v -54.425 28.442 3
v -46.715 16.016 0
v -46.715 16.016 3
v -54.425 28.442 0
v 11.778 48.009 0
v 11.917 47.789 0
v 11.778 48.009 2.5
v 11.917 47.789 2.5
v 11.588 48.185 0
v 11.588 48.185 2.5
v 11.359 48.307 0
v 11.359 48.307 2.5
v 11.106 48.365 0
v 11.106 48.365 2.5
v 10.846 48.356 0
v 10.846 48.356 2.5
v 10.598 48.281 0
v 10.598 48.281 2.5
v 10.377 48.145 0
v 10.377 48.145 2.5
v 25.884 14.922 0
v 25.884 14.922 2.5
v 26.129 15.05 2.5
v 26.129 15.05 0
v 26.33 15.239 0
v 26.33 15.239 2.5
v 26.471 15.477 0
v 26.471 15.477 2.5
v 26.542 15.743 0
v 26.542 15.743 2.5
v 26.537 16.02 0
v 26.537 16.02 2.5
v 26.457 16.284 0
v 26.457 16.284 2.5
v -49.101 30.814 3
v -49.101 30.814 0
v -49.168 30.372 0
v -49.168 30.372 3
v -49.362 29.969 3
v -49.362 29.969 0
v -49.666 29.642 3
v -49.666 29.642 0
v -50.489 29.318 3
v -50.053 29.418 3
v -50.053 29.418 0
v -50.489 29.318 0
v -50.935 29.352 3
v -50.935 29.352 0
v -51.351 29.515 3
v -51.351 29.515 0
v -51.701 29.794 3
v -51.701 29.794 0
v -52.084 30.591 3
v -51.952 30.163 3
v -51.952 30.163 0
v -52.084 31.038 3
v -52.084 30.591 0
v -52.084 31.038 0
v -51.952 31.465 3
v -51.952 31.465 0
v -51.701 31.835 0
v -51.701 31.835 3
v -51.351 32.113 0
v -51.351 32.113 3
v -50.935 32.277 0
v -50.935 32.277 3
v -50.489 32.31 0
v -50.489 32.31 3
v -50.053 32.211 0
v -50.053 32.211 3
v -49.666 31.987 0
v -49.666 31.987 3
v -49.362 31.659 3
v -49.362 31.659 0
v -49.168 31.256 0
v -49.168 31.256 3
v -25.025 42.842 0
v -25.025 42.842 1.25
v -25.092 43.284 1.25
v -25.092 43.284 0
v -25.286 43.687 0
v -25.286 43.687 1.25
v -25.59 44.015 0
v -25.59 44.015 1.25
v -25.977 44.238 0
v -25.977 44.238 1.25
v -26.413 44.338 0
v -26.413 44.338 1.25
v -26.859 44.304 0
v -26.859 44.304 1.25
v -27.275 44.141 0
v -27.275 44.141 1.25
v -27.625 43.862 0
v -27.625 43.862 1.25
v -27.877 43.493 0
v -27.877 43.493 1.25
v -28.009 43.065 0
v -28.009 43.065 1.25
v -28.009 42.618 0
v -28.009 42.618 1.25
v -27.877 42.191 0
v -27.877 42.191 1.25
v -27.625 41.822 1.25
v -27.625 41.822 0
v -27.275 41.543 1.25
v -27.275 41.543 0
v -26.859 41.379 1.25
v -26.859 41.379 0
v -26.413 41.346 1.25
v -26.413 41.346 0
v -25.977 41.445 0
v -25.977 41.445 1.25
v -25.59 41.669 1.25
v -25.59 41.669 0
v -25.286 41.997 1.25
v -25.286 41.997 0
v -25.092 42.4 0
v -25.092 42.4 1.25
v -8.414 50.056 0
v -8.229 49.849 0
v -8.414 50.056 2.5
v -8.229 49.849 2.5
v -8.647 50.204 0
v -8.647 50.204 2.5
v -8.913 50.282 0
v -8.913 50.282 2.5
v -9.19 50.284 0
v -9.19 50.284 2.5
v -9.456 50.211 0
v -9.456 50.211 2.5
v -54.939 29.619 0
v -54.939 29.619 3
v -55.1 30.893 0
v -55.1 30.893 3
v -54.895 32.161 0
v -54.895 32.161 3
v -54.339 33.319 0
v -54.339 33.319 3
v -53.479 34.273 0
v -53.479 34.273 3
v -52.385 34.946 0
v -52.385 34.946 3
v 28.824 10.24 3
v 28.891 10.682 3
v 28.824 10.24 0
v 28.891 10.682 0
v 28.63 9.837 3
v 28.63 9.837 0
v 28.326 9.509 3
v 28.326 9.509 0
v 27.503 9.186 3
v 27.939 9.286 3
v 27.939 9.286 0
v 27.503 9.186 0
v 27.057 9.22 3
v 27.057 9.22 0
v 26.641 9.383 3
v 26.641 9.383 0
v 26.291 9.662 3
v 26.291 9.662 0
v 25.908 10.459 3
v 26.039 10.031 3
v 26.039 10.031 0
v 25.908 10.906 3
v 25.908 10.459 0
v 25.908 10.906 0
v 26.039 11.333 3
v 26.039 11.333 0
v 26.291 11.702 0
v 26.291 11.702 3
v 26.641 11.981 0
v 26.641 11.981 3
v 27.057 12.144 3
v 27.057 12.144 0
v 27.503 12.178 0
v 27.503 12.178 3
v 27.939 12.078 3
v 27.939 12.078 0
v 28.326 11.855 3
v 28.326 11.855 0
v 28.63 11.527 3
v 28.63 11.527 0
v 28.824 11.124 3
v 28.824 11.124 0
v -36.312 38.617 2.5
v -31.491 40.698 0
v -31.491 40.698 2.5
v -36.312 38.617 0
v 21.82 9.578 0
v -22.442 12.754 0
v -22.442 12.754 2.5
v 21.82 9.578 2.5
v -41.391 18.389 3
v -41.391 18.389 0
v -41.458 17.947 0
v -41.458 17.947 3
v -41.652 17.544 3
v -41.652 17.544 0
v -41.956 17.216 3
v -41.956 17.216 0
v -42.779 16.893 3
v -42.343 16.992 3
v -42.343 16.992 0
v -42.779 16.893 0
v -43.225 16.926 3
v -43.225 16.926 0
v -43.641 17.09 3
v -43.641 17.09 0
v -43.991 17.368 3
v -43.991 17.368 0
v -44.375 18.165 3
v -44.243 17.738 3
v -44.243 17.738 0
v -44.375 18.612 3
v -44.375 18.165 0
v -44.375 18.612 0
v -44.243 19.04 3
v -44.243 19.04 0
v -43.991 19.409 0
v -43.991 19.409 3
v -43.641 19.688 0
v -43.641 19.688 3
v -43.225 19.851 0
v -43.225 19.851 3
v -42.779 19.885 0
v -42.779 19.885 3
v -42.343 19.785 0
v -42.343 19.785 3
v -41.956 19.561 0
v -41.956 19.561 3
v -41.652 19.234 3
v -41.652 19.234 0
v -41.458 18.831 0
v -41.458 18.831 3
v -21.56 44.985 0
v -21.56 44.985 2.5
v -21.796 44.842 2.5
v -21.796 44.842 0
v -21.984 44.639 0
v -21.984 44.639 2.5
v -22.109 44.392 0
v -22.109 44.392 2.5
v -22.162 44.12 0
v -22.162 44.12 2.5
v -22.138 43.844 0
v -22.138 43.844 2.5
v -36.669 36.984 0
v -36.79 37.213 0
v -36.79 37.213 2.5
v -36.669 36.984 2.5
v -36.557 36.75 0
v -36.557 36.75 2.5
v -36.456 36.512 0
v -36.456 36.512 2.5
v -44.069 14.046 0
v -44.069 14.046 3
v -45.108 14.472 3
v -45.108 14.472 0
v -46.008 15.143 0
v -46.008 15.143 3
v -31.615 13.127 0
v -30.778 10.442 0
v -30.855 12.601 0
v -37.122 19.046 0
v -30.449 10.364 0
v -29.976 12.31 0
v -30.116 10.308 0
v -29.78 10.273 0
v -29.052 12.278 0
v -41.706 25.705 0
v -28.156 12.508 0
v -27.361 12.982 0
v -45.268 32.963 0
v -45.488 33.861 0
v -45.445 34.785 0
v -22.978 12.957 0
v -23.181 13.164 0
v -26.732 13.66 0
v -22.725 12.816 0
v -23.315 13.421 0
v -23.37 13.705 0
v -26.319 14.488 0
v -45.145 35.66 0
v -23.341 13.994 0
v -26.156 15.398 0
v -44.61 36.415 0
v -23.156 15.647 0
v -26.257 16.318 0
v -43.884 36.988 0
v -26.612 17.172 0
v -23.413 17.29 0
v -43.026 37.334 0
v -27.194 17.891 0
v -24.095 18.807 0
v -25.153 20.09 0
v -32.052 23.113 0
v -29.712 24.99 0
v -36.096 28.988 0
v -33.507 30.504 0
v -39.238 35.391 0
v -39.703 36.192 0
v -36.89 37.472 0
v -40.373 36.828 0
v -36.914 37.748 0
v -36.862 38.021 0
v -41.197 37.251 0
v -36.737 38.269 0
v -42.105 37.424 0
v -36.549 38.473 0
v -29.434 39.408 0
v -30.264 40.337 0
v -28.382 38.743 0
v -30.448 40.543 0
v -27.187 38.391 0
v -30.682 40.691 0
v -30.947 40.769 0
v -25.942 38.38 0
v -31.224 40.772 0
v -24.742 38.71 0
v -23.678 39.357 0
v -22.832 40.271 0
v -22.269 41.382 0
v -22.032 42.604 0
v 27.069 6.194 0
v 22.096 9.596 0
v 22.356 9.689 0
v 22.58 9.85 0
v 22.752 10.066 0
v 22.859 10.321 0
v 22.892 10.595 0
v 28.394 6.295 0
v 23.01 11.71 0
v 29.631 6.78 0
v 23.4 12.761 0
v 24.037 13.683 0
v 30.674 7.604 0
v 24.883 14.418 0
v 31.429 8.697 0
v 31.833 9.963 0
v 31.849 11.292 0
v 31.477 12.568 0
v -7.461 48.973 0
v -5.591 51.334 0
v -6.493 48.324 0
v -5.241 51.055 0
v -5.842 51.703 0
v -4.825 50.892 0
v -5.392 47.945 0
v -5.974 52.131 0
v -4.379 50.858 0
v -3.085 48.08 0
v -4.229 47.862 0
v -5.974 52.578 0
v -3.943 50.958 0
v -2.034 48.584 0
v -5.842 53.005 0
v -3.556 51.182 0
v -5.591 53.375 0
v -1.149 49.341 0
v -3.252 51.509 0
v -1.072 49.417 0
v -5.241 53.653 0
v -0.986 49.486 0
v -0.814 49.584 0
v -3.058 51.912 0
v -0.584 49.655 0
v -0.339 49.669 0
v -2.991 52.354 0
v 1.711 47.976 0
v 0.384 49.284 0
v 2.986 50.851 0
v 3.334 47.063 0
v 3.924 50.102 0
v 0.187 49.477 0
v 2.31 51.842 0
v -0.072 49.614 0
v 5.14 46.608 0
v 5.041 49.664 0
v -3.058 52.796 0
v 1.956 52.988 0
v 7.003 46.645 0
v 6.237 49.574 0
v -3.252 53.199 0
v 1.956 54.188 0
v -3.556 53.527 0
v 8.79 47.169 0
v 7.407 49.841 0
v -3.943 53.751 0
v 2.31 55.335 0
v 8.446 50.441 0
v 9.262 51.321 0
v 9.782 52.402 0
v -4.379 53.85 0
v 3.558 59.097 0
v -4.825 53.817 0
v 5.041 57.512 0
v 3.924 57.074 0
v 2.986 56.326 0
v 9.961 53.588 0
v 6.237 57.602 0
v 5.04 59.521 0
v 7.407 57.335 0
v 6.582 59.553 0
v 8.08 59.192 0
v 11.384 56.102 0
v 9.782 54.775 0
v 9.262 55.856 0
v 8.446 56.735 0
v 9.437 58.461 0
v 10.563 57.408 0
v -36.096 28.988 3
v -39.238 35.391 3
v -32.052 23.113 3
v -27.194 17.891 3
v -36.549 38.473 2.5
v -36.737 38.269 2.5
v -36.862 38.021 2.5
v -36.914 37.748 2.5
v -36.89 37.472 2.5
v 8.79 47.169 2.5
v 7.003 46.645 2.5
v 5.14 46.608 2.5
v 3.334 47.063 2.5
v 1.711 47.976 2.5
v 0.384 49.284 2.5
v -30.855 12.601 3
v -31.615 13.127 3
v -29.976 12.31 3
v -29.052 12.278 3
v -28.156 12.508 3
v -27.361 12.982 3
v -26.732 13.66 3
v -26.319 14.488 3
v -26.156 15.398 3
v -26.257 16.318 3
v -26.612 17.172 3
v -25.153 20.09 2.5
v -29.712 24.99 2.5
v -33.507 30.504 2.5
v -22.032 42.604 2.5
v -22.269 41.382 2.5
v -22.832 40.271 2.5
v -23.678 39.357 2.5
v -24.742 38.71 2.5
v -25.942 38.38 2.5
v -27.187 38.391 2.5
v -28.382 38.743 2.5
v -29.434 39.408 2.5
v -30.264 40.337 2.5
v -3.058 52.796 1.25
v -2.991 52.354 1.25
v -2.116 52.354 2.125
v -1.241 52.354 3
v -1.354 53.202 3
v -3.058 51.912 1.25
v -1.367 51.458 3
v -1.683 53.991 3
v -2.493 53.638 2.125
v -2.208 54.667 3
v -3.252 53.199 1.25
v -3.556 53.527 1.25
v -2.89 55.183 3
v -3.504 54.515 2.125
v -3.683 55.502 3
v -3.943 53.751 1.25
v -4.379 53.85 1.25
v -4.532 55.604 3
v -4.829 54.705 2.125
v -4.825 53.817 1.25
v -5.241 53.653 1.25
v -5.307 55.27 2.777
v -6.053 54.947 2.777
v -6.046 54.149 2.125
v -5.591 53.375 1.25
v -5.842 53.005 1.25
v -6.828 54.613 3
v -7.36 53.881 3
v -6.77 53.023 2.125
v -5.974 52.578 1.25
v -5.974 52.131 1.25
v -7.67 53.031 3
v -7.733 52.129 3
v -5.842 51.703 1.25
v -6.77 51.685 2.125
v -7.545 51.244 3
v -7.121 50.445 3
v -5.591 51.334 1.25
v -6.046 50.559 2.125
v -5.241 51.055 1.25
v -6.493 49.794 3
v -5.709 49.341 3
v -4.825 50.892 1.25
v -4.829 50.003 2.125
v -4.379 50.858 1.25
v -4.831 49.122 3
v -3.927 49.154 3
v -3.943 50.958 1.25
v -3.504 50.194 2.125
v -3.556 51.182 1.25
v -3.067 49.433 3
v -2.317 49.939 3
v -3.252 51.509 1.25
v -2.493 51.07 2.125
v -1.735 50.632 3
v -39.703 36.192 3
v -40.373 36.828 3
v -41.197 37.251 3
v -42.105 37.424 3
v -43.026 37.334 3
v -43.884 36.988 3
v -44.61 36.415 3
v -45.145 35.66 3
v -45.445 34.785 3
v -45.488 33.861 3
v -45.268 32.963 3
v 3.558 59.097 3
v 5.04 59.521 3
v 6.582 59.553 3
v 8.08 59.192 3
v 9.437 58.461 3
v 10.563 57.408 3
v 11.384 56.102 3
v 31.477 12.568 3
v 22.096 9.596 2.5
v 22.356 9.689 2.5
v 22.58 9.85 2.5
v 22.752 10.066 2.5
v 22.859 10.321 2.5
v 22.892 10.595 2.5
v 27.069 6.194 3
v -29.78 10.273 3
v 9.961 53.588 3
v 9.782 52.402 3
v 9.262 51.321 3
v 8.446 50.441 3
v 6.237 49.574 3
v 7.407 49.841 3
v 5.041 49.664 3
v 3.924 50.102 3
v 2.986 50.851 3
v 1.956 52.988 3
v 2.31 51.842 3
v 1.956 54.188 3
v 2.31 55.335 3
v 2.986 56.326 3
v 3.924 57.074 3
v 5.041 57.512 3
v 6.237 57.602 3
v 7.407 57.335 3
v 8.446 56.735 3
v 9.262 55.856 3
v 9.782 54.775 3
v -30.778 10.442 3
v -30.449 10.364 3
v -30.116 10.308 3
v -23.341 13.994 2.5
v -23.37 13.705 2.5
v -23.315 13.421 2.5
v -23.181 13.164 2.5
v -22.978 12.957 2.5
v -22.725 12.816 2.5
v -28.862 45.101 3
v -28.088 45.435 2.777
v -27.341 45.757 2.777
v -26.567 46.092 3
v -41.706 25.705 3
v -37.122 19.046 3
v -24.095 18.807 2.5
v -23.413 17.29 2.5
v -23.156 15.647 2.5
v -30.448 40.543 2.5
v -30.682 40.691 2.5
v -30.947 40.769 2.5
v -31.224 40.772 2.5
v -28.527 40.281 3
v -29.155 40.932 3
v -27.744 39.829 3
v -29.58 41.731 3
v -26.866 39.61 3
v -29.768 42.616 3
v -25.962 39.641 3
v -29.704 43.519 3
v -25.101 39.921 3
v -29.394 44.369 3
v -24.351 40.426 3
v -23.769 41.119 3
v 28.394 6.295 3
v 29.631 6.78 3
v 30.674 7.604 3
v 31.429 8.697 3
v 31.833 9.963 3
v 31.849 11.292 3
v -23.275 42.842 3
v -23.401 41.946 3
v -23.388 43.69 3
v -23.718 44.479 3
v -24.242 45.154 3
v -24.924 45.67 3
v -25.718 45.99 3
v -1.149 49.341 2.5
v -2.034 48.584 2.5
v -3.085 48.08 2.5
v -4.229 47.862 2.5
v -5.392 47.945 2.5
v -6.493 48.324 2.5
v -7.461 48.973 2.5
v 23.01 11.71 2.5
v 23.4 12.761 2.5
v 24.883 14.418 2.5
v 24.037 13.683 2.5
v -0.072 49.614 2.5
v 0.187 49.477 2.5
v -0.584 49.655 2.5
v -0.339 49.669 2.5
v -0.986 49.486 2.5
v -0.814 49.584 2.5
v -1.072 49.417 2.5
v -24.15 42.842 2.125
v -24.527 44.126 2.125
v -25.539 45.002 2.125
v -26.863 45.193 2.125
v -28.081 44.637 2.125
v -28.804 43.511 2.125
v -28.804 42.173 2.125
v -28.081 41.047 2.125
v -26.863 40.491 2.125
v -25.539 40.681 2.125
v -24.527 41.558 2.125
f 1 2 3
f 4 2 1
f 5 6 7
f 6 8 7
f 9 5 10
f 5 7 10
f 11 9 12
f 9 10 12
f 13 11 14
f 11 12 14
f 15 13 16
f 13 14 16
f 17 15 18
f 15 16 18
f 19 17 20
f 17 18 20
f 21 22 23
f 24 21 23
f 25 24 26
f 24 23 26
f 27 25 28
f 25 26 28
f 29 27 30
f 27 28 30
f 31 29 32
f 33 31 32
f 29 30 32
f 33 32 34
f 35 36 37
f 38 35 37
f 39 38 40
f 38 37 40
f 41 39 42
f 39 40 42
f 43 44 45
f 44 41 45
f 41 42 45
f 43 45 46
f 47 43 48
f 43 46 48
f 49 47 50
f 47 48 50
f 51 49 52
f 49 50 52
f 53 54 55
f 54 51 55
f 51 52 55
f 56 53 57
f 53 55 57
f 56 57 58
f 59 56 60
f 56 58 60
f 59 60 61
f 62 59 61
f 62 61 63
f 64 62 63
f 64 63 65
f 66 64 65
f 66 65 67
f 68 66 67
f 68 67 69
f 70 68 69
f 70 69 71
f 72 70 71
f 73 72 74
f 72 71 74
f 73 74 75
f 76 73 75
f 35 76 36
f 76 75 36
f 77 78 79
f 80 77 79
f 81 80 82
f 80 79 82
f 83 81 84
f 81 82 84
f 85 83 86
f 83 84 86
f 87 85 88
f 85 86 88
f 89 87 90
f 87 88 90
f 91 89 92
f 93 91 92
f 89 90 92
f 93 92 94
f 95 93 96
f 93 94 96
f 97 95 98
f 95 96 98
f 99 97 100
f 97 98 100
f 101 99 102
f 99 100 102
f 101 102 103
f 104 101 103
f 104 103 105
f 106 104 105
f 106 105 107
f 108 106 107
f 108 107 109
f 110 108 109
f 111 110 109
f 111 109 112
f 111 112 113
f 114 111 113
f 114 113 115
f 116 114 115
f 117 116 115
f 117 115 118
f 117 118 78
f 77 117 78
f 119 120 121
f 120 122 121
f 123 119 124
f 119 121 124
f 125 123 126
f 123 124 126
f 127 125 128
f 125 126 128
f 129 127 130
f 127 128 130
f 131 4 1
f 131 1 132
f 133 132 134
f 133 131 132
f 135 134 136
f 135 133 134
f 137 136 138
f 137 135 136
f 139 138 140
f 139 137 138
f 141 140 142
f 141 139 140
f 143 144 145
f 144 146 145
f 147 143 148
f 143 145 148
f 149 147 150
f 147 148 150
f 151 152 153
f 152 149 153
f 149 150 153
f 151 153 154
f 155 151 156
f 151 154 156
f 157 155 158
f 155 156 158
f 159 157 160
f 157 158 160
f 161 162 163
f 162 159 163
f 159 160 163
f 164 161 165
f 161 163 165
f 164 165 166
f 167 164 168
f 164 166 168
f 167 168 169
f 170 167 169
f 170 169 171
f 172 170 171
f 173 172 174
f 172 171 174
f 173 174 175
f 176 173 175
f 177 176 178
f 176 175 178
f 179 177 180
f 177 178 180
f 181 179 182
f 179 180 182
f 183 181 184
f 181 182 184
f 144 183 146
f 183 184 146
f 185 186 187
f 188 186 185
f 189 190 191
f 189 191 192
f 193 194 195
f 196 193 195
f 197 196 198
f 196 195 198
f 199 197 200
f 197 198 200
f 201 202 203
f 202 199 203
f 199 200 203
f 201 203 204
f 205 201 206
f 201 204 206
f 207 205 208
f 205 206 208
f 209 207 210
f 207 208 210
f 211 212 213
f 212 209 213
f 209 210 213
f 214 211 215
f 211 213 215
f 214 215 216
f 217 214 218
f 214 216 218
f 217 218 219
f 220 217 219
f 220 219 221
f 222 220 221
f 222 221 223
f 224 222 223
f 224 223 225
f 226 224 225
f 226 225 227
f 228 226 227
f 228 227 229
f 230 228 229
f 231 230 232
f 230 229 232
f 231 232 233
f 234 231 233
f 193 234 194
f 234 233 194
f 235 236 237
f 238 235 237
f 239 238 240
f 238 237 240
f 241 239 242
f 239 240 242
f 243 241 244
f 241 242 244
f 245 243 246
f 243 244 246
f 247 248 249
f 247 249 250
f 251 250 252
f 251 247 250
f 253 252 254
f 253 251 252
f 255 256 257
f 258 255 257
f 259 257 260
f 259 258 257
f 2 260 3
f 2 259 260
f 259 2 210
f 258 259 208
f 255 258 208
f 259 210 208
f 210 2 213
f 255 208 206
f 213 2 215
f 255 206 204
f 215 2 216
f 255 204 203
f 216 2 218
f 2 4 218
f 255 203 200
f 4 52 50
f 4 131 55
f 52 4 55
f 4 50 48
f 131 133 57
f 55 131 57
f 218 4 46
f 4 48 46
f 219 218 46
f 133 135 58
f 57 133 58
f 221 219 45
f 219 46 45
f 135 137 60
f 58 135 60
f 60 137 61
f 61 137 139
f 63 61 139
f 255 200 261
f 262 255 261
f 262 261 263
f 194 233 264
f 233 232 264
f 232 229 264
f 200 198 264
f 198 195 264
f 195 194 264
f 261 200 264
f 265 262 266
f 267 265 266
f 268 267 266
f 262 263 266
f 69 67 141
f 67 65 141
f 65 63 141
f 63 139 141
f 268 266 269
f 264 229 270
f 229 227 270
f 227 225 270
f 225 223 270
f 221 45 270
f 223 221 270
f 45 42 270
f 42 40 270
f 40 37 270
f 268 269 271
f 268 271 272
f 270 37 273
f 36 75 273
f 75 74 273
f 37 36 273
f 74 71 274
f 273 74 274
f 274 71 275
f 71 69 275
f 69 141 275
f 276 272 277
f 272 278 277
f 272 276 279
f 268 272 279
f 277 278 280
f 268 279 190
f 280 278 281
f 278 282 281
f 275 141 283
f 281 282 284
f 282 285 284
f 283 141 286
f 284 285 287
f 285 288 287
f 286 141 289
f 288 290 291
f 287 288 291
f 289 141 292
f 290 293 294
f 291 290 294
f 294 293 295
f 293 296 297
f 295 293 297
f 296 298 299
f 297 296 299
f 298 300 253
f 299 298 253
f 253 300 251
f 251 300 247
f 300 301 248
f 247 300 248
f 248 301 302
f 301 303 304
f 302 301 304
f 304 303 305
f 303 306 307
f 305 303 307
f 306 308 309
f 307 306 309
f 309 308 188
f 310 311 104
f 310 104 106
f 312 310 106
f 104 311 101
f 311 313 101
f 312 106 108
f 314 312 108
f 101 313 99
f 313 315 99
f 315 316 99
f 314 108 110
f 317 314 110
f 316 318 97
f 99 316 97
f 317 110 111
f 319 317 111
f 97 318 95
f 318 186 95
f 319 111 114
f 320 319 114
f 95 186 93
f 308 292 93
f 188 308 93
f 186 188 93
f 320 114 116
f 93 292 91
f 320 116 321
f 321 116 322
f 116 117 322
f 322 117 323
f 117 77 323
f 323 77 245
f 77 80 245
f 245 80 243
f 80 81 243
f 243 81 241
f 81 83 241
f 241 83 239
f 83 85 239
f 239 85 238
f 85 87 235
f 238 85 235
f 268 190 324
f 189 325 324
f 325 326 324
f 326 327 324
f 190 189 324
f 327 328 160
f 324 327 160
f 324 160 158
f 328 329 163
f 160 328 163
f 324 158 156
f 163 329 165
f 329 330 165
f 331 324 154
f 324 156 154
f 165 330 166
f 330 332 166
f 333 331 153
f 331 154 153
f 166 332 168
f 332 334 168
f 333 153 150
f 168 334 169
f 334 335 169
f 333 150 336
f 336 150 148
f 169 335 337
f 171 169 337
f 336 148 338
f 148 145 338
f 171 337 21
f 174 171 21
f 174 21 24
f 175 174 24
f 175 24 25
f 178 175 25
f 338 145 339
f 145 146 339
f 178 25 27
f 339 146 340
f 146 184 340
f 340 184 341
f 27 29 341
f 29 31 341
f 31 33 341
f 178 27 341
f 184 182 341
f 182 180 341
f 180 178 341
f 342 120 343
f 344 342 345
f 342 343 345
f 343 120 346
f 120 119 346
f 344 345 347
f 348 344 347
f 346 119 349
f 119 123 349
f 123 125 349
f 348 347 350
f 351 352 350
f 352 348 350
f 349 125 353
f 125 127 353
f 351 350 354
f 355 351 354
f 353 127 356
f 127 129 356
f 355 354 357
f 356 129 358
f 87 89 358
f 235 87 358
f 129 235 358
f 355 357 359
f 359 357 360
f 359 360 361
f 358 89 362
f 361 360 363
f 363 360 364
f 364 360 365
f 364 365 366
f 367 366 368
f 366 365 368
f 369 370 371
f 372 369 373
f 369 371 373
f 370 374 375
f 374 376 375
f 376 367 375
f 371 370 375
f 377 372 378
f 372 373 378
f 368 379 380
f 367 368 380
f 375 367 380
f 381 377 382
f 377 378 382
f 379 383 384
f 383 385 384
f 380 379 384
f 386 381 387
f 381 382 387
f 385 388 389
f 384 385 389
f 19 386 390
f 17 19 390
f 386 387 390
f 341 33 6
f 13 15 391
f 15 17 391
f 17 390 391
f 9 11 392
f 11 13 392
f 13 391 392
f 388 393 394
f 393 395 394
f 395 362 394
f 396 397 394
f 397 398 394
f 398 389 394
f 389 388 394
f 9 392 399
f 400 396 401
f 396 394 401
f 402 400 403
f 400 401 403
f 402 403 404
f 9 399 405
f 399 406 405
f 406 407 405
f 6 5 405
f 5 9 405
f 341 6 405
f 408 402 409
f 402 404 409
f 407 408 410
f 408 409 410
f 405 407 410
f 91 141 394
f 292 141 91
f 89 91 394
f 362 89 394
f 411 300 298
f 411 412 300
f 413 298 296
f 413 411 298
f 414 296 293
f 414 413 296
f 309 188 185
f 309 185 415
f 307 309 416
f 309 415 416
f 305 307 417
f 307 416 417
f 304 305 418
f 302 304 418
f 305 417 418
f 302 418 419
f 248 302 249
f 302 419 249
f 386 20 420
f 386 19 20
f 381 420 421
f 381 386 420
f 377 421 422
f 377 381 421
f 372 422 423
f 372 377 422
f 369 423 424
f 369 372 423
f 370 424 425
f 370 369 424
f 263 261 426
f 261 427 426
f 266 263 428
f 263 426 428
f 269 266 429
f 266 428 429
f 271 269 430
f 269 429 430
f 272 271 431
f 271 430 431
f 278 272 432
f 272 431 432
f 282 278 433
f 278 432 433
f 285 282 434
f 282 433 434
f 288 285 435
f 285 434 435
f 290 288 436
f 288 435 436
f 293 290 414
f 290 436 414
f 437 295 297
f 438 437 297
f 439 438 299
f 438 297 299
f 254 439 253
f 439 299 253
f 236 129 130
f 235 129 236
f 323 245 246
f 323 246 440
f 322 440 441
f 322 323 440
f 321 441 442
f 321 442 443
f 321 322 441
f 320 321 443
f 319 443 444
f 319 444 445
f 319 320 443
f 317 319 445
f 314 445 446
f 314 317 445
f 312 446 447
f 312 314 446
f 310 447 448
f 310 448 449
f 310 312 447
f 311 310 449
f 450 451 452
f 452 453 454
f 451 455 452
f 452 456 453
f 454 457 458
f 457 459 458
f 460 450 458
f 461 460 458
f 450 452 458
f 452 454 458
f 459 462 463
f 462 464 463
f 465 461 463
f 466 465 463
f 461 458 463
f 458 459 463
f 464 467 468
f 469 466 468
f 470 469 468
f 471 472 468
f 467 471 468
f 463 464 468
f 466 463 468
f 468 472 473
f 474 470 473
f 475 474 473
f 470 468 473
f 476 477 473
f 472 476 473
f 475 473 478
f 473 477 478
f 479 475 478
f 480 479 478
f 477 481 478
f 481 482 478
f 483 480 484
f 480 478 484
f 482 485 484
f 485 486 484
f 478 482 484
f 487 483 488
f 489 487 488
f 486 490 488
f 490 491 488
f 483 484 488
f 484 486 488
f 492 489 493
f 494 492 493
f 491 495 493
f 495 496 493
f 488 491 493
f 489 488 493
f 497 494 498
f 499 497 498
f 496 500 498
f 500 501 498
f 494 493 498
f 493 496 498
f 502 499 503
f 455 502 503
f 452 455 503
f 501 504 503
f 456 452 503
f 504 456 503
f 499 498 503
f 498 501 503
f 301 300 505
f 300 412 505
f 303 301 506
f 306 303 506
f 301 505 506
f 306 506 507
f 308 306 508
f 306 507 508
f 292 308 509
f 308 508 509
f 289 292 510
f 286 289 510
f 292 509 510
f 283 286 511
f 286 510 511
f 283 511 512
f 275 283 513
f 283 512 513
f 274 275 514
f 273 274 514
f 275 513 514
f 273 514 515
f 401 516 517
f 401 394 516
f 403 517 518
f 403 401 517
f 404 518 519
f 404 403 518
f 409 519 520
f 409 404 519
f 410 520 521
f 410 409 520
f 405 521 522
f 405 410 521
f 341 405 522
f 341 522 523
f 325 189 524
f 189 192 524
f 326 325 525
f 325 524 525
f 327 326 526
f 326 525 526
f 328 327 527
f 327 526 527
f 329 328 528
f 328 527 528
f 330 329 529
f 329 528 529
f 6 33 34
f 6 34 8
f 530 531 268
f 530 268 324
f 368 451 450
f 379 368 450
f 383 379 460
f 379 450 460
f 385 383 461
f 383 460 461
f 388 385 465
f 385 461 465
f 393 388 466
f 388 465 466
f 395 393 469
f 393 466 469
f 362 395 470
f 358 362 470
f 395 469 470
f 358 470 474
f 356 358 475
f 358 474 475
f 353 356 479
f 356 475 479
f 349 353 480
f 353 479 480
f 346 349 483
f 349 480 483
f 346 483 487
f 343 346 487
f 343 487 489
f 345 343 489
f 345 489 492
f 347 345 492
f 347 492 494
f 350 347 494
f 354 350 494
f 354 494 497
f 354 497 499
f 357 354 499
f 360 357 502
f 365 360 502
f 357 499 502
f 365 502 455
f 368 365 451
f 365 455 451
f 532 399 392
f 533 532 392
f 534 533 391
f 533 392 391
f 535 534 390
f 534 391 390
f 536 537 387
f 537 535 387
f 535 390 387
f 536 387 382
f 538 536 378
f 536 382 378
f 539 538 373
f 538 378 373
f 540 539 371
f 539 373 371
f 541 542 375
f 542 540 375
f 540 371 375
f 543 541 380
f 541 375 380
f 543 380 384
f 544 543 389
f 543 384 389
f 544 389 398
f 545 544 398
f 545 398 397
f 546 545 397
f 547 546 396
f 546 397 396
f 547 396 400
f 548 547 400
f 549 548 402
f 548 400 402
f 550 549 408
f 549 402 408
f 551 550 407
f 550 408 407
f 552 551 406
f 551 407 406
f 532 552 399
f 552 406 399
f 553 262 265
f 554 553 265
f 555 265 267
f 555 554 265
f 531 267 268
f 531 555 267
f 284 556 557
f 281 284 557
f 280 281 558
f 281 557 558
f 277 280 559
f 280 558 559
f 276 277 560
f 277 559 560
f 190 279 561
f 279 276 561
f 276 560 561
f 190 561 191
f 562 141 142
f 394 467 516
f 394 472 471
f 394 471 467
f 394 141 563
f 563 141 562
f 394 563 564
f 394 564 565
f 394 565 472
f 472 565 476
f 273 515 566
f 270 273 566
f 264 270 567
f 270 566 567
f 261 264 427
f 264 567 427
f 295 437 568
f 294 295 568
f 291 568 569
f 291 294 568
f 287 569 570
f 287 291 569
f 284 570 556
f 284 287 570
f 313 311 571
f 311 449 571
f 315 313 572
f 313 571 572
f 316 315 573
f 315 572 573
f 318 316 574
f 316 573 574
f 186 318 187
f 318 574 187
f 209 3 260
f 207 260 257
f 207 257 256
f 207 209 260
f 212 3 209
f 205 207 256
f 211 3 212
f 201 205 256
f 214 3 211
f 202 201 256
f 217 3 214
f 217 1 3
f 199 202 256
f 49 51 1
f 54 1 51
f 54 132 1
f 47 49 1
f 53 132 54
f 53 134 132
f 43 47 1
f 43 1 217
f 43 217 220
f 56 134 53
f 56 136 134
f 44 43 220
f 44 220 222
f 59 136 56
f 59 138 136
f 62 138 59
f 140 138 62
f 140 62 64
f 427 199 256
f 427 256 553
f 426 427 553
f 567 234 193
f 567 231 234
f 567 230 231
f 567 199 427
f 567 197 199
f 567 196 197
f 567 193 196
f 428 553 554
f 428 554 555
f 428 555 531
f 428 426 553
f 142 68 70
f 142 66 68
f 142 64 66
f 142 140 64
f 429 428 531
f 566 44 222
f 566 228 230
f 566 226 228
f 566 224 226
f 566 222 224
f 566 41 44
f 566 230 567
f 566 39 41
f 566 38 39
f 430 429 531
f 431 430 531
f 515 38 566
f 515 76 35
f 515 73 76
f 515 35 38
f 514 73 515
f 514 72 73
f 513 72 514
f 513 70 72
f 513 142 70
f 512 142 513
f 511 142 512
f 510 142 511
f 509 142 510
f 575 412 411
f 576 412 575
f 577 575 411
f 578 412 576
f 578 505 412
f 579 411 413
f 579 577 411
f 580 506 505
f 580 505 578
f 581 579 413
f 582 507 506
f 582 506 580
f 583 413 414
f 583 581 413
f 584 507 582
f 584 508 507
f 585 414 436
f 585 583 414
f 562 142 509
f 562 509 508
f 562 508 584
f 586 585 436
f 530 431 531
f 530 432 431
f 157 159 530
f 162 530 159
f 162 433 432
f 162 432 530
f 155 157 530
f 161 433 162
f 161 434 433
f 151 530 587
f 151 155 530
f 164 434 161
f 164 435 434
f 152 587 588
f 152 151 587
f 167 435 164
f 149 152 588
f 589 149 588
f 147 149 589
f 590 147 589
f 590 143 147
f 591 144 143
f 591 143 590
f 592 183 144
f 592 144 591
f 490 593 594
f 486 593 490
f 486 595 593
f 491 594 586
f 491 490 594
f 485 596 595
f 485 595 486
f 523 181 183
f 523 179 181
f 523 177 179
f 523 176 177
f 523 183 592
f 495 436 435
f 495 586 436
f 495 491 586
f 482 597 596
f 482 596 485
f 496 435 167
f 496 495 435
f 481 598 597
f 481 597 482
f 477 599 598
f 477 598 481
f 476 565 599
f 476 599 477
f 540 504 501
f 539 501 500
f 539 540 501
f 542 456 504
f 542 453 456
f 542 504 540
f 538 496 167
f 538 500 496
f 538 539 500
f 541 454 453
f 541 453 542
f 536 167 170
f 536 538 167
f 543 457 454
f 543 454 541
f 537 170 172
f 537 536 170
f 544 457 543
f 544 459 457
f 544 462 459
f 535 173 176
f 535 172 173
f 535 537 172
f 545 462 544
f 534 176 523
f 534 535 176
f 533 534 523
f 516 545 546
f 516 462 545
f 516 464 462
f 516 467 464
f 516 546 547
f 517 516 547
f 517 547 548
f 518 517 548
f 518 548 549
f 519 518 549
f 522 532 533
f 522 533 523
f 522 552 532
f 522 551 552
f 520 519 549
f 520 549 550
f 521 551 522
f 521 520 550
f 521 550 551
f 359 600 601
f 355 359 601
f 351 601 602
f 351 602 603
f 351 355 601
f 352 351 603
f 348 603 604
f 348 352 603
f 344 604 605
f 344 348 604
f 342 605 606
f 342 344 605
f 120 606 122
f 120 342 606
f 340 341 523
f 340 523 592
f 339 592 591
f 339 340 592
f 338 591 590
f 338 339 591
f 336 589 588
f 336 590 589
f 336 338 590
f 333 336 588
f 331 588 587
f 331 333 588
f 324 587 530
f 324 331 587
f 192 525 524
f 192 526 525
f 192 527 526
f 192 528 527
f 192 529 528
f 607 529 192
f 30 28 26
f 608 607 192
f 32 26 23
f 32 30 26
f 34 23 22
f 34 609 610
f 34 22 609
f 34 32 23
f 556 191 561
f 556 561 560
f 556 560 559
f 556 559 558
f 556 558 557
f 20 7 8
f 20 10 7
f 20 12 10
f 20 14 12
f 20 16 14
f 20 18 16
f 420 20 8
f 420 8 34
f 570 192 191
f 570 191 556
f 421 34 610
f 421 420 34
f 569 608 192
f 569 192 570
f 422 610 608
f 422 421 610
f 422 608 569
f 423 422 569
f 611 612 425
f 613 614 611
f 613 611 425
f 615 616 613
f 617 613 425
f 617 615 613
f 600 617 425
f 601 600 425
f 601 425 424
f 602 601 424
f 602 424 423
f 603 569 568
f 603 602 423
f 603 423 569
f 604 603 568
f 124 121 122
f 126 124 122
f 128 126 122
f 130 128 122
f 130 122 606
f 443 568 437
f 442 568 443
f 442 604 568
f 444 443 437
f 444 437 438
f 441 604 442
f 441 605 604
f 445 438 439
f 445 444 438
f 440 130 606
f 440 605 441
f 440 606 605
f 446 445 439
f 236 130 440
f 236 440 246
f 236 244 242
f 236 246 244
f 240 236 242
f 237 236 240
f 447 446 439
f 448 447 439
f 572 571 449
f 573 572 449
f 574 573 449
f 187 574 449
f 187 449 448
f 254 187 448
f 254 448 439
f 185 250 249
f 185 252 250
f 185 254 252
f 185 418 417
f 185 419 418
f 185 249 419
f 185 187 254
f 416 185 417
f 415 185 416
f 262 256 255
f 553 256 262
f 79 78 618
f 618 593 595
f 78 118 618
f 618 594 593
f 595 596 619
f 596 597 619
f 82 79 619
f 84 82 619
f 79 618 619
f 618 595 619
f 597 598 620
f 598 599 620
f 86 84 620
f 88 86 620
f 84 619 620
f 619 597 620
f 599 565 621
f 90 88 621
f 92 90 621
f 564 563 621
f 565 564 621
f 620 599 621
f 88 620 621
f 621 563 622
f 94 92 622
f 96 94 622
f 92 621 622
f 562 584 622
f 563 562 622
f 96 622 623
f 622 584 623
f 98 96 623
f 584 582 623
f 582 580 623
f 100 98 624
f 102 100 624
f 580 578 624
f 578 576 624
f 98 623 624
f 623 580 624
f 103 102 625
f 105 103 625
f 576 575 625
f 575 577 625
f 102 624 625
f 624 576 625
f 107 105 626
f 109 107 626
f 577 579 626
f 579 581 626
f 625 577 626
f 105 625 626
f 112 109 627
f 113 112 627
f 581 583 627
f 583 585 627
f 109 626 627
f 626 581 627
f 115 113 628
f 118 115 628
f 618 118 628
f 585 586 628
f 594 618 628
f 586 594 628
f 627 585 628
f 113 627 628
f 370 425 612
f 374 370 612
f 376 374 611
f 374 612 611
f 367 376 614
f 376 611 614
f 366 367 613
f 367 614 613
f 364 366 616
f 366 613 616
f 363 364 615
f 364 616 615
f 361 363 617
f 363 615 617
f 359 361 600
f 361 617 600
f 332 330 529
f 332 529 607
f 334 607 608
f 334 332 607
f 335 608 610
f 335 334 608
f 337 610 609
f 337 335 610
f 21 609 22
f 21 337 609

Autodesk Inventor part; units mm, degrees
ref_plane "YZ Plane" through (0, 0, 0) normal (1, 0, 0) x (0, 1, 0)
ref_plane "XZ Plane" through (0, 0, 0) normal (0, 1, 0) x (-1, 0, 0)
ref_plane "XY Plane" through (0, 0, 0) normal (0, 0, 1) x (1, 0, 0)
sketch "スケッチ1" plane through (0, 0, 0) normal (0, 0, 1) x (1, 0, 0)
  circle A0 centre (0, 0) radius 20.55 construction
  circle A1 centre (-21.6908, -16.4118) radius 19.1 construction
  circle A2 centre (25.3202, -9.9362) radius 19.1 construction
  circle A3 centre (-50.601, 30.8143) radius 1.5
  circle A4 centre (5.9362, 53.5882) radius 1.5
  circle A5 centre (27.3908, 10.6821) radius 1.5
  circle A6 centre (-42.8914, 18.3887) radius 1.5
  circle A7 centre (-21.6908, -16.4118) radius 4.025
  circle A8 centre (25.3202, -9.9362) radius 4.025
  circle A9 centre (0, 0) radius 4
  line L0 (-17.8785, -18.8026) -> (-30.4168, -38.7963) construction
  arc A10 (-17.8785, -18.8026) -> (-19.2493, -12.6317) centre (-21.6908, -16.4118) ccw construction
  line L1 (-19.2493, -12.6317) -> (-39.0737, 0.1727) construction
  line L2 (37.1409, -30.8522) -> (21.8866, -12.8448) construction
  arc A11 (22.3659, -6.5417) -> (21.8866, -12.8448) centre (25.3202, -9.9362) ccw construction
  line L3 (22.3659, -6.5417) -> (40.1678, 8.9519) construction
  line L4 (-21.6908, -16.4118) -> (-99.9742, 13.5882) construction
  line L5 (-105.5257, -16.4118) -> (-21.6908, -16.4118) construction
  line L6 (-21.6908, -16.4118) -> (-101.7113, -41.4118) construction
  line L7 (25.3202, -9.9362) -> (102.5386, -46.4118) construction
  line L8 (110.4743, -16.4118) -> (25.3202, -9.9362) construction
  line L9 (25.3202, -9.9362) -> (108.6869, 8.5882) construction
  line L10 (-18.0583, -13.7557) -> (-31.9879, 5.2949) construction
  line L11 (-17.339, -17.5569) -> (-24.5367, -44.9106) construction
  line L12 (21.5077, -7.5456) -> (34.045, 12.4488) construction
  line L13 (21.0739, -11.4259) -> (31.6059, -41.446) construction
  arc A12 (-24.6176, -40.3201) -> (-19.5065, -44.4166) centre (-20.132, -39.9603) ccw
  circle A13 centre (-20.132, -39.9603) radius 3 construction
  arc A14 (-38.9879, 7.9907) -> (-39.3359, 8.5262) centre (-35.3982, 10.7044) ccw construction
  circle A15 centre (-35.3982, 10.7044) radius 3 construction
  arc A16 (-31.9879, 5.2949) -> (-33.8465, 6.7744) centre (-35.6204, 2.6388) ccw construction
  circle A17 centre (-41.5152, -3.6073) radius 1.5
  line L14 (-33.8465, 6.7744) -> (-56.066, 16.3055) construction
  line L15 (-41.3386, 0.8892) -> (-72.6317, 2.1181) construction
  circle A18 centre (-42.8914, 18.3887) radius 3 construction
  circle A19 centre (-35.3982, 10.7044) radius 1.5
  circle A20 centre (36.7736, 17.5344) radius 1.5
  arc A21 (40.7942, 15.5132) -> (40.1934, 20.4593) centre (36.7736, 17.5344) ccw
  circle A22 centre (25.6508, -33.5339) radius 1.5
  arc A23 (26.2763, -37.9902) -> (30.1508, -33.5178) centre (25.6508, -33.5339) ccw
  circle A24 centre (36.7736, 17.5344) radius 3 construction
  circle A25 centre (25.6508, -33.5339) radius 3 construction
  arc A26 (36.6836, 14.4025) -> (34.045, 12.4488) centre (37.8575, 10.0583) ccw construction
  line L16 (36.6836, 14.4025) -> (64.1968, 21.8369) construction
  line L17 (43.2599, 10.0553) -> (82.9273, 8.8396) construction
  circle A27 centre (27.3908, 10.6821) radius 3 construction
  circle A28 centre (-21.6908, -16.4118) radius 7.025 construction
  circle A29 centre (25.3202, -9.9362) radius 7.025 construction
  arc A30 (40.8593, 15.6483) -> (30.1508, -33.5178) centre (146.4685, -33.1029) ccw
  arc A31 (-24.6176, -40.3201) -> (-39.1827, 8.2484) centre (-145.1158, -49.988) ccw
  arc A32 (-52.2824, 34.9884) -> (-54.1907, 28.1005) centre (-50.601, 30.8143) ccw
  arc A33 (9.356, 56.5132) -> (4.2549, 57.7623) centre (5.9362, 53.5882) ccw
  line L18 (-39.1827, 8.2484) -> (-54.1907, 28.1005)
  line L19 (-52.2824, 34.9884) -> (4.2549, 57.7623)
  line L20 (9.356, 56.5132) -> (40.1934, 20.4593)
  line L21 (-19.5065, -44.4166) -> (26.2763, -37.9902)
  circle A34 centre (-20.132, -39.9603) radius 1.5
  line L22 (-23.8868, -42.4405) -> (-17.339, -17.5569)
  arc A35 (-17.339, -17.5569) -> (-18.0583, -13.7557) centre (-21.6908, -16.4118) ccw
  line L23 (-18.0583, -13.7557) -> (-31.9879, 5.2949)
  arc A36 (-31.9879, 5.2949) -> (-33.8465, 6.7744) centre (-35.6204, 2.6388) ccw
  line L24 (-33.8465, 6.7744) -> (-40.0946, 9.4545)
  line L25 (40.7974, 15.5141) -> (36.6836, 14.4025)
  arc A37 (36.6836, 14.4025) -> (34.045, 12.4488) centre (37.8575, 10.0583) ccw
  line L26 (34.045, 12.4488) -> (21.5077, -7.5456)
  arc A38 (21.5077, -7.5456) -> (21.0739, -11.4259) centre (25.3202, -9.9362) ccw
  line L27 (21.0739, -11.4259) -> (29.592, -35.7057)
  dimension "d0" = 8.05
  dimension "d1" = 8.05
  dimension "d2" = 8
  dimension "d3" = 20.968
  dimension "d4" = 20.968
  dimension "d5" = 17.35
  dimension "d6" = 17.35
  dimension "d7" = 16.877
  dimension "d8" = 16.877
  dimension "d9" = 20.936
  dimension "d10" = 20.936
  dimension "d11" = 9
  dimension "d12" = 6
  dimension "d13" = 9
  dimension "d14" = 6
  dimension "d15" = 9
  dimension "d16" = 20.968
  dimension "d17" = 20.968
  dimension "d18" = 6
  dimension "d19" = 3
  dimension "d20" = 3
  dimension "d21" = 9
  dimension "d22" = 3
  dimension "d23" = 9
  dimension "d24" = 6
  dimension "d25" = 6
  dimension "d26" = 9
  dimension "d27" = 16.877
  dimension "d28" = 3
  dimension "d29" = 3
  dimension "d30" = 9
  dimension "d31" = 9
  dimension "d32" = 3
sketch "スケッチ2" plane through (0, 0, 0) normal (0, 0, 1) x (1, 0, 0)
  circle A0 centre (-50.601, 30.8143) radius 1.5 projected
  circle A1 centre (-42.8914, 18.3887) radius 1.5 projected
  circle A2 centre (5.9362, 53.5882) radius 1.5 projected
  circle A3 centre (27.3908, 10.6821) radius 1.5 projected
  arc A4 (-52.3846, 34.9457) -> (-54.4248, 28.4418) centre (-50.601, 30.8143) ccw
  arc A5 (-46.7151, 16.0162) -> (-43.3819, 13.9155) centre (-42.8914, 18.3887) ccw
  arc A6 (11.384, 56.1025) -> (3.5581, 59.0968) centre (5.9362, 53.5882) ccw
  arc A7 (26.9003, 6.2089) -> (31.4766, 12.5678) centre (27.3908, 10.6821) ccw
  line L0 (-46.7151, 16.0162) -> (-54.4248, 28.4418)
  line L1 (-52.3846, 34.9457) -> (3.5581, 59.0968)
  line L2 (11.384, 56.1025) -> (31.4766, 12.5678)
  line L3 (26.9003, 6.2089) -> (-43.3819, 13.9155)
  circle A8 centre (5.9362, 53.5882) radius 4.025
  point P0 (0, 0)
  dimension "d33" = 3
  dimension "d34" = 3
  dimension "d35" = 4.5
  dimension "d36" = 3
  dimension "d39" = 8.05
extrude "押し出し1" add sketch "スケッチ2" along normal blind 3 contours L1 A6 L2 A7 L3 A5 L0 A4
sketch "スケッチ3" plane through (0, 0, 3) normal (0, 0, 1) x (1, 0, 0)
  circle A0 centre (5.9362, 53.5882) radius 4.025 projected
  circle A1 centre (27.3908, 10.6821) radius 1.5 projected
  circle A2 centre (-42.8914, 18.3887) radius 1.5 projected
  circle A3 centre (-50.601, 30.8143) radius 1.5 projected
  line L0 (-54.4248, 28.4418) -> (-46.7151, 16.0162) projected
  arc A4 (-46.7151, 16.0162) -> (-43.3819, 13.9155) centre (-42.8914, 18.3887) ccw projected
  line L1 (-43.3819, 13.9155) -> (26.9003, 6.2089) projected
  arc A5 (26.9003, 6.2089) -> (31.4766, 12.5678) centre (27.3908, 10.6821) ccw projected
  line L2 (31.4766, 12.5678) -> (11.384, 56.1025) projected
  arc A6 (11.384, 56.1025) -> (3.5581, 59.0968) centre (5.9362, 53.5882) ccw projected
  line L3 (3.5581, 59.0968) -> (-52.3846, 34.9457) projected
  arc A7 (-52.3846, 34.9457) -> (-54.4248, 28.4418) centre (-50.601, 30.8143) ccw projected
  circle A8 centre (5.9362, 53.5882) radius 6
  circle A9 centre (-26.5254, 42.8418) radius 1.5
  circle A10 centre (-4.491, 52.3543) radius 1.5
  circle A11 centre (-4.491, 52.3543) radius 4.5 construction
  point P0 (0, 0)
  dimension "d40" = 12
  dimension "d41" = 3
  dimension "d42" = 3
  dimension "d43" = 3
  dimension "d44" = 3
  dimension "d45" = 24
  dimension "d46" = 9
extrude "押し出し2" cut sketch "スケッチ3" against normal blind 10 contours A9 | A10
chamfer "面取り1" distance 1.75 angle 45 2 edges at (-5.991, 52.3543, 3) (-28.0254, 42.8418, 3)
sketch "スケッチ4" plane through (0, 0, 3) normal (0, 0, 1) x (1, 0, 0)
  circle A0 centre (127.6431, 30.2622) radius 1.5
  circle A1 centre (5.9362, 53.5882) radius 1.5
  line L0 (5.9362, 53.5882) -> (127.6431, 30.2622) construction
  circle A2 centre (5.9362, 53.5882) radius 4.025
  circle A3 centre (127.6431, 30.2622) radius 4.025
  arc A4 (127.2517, 23.2481) -> (128.9655, 37.1616) centre (127.6431, 30.2622) ccw
  line L1 (12.8357, 52.2659) -> (13.4004, 55.2122)
  line L2 (15.4628, 54.817) -> (26.0698, 52.7841)
  line L3 (28.1322, 52.3888) -> (27.5675, 49.4424)
  line L4 (14.8981, 51.8706) -> (25.5051, 49.8377)
  line L5 (120.7437, 31.5845) -> (121.3084, 34.5309)
  line L6 (119.246, 34.9262) -> (108.639, 36.9591)
  line L7 (106.5765, 37.3543) -> (106.0119, 34.408)
  line L8 (108.0743, 34.0127) -> (118.6813, 31.9798)
  circle A5 centre (19.3546, 46.4346) radius 3
  circle A6 centre (112.5307, 28.5767) radius 3
  line L9 (7.2586, 60.4876) -> (128.9655, 37.1616)
  arc A7 (17.9263, 42.1672) -> (21.5465, 42.5045) centre (19.3546, 46.4346) ccw
  arc A8 (109.041, 25.7356) -> (112.28, 24.0837) centre (112.5307, 28.5767) ccw
  line L10 (3.7066, 46.9264) -> (17.9263, 42.1672)
  line L11 (112.28, 24.0837) -> (127.2517, 23.2481)
  circle A9 centre (19.3546, 46.4346) radius 1.5
  circle A10 centre (112.5307, 28.5767) radius 1.5
  line L12 (32.3442, 48.5269) -> (21.5465, 42.5045)
  line L13 (109.041, 25.7356) -> (101.2351, 35.3235)
  line L14 (32.3442, 48.5269) -> (101.2351, 35.3235)
  arc A11 (108.639, 36.9591) -> (106.5765, 37.3543) centre (107.6078, 37.1567) ccw
  arc A12 (106.0119, 34.408) -> (108.0743, 34.0127) centre (107.0431, 34.2103) ccw
  arc A13 (121.3084, 34.5309) -> (119.246, 34.9262) centre (120.2772, 34.7285) ccw
  arc A14 (118.6813, 31.9798) -> (120.7437, 31.5845) centre (119.7125, 31.7821) ccw
  arc A15 (28.1322, 52.3888) -> (26.0698, 52.7841) centre (27.101, 52.5864) ccw
  arc A16 (25.5051, 49.8377) -> (27.5675, 49.4424) centre (26.5363, 49.64) ccw
  arc A17 (15.4628, 54.817) -> (13.4004, 55.2122) centre (14.4316, 55.0146) ccw
  arc A18 (12.8357, 52.2659) -> (14.8981, 51.8706) centre (13.8669, 52.0682) ccw
  line L15 (5.9362, 53.5882) -> (-35.9404, 22.842) construction
  circle A19 centre (-35.9404, 22.842) radius 1.5
  arc A20 (-37.7159, 25.2602) -> (-34.165, 20.4238) centre (-35.9404, 22.842) ccw
  line L16 (-37.7159, 25.2602) -> (-0.9595, 52.247)
  line L17 (-34.165, 20.4238) -> (2.5914, 47.4106)
  arc A21 (7.2586, 60.4876) -> (-0.9595, 52.247) centre (5.9362, 53.5882) ccw
  arc A22 (2.5914, 47.4106) -> (3.7066, 46.9264) centre (5.9362, 53.5882) ccw
  circle A23 centre (0, 0) radius 10.1 construction
  circle A24 centre (25.3202, -9.9362) radius 17.1 construction
  circle A25 centre (110.4743, -16.4118) radius 28.1 construction
  circle A26 centre (62.4131, -12.7569) radius 20.1 construction
  circle A27 centre (-21.6908, -16.4118) radius 17.1 construction
  circle A28 centre (-105.5257, -16.4118) radius 28.1 construction
  line L18 (-170.915, -81.4118) -> (490.0044, -81.4118)
  line L19 (-105.5257, -16.4118) -> (-21.6908, -16.4118) construction
  line L20 (110.4743, -16.4118) -> (25.3202, -9.9362) construction
  line L21 (110.4743, -16.4118) -> (104.1501, -0.632)
  line L22 (104.1501, -0.632) -> (95.5937, 20.7173) construction
  line L23 (95.5937, 20.7173) -> (70.4743, -10.4118) construction
  line L24 (70.4743, -10.4118) -> (110.4743, -16.4118) construction
  line L25 (-137.6819, 53.5882) -> (165.8186, 53.5882)
  line L26 (25.3202, -9.9362) -> (108.6869, 8.5882) construction
  line L27 (25.3202, -9.9362) -> (102.5386, -46.4118) construction
  line L28 (25.3202, -9.9362) -> (5.9362, 53.5882) construction
  line L29 (5.9362, 53.5882) -> (127.6431, 30.2622)
  line L30 (127.6431, 30.2622) -> (110.4743, -16.4118) construction
  line L31 (102.5386, -46.4118) -> (118.0681, 0.8329) construction
  line L32 (118.0681, 0.8329) -> (5.9362, 53.5882) construction
  line L33 (108.6869, 8.5882) -> (129.8583, 53.5882) construction
  line L34 (129.8583, 53.5882) -> (5.9362, 53.5882) construction
  line L35 (119.2726, 31.0882) -> (366.4441, 68.5882) construction
  line L36 (119.0587, 6.9252) -> (362.0213, 65.8249) construction
  line L37 (110.3034, -22.7894) -> (351.0624, 44.5537) construction
  line L38 (127.6431, 30.2622) -> (4.1927, 19.4617) construction
  circle A29 centre (80.4743, 23.124) radius 3 construction
  circle A30 centre (80.4743, 23.124) radius 1.5
  arc A31 (79.801, 27.5733) -> (76.162, 24.4099) centre (80.4743, 23.124) ccw
  circle A32 centre (70.4743, -10.4118) radius 1.5
  arc A33 (66.162, -9.1259) -> (69.4242, -14.7876) centre (70.4743, -10.4118) ccw
  circle A34 centre (150.4743, 0.5882) radius 1.5
  arc A35 (152.5623, -3.3981) -> (154.0408, 3.3323) centre (150.4743, 0.5882) ccw
  circle A36 centre (127.6431, 30.2622) radius 1.5
  arc A37 (131.2816, 32.9102) -> (126.9698, 34.7115) centre (127.6431, 30.2622) ccw
  circle A38 centre (110.4743, -16.4118) radius 5
  arc A39 (108.6075, -24.1909) -> (114.1862, -23.4986) centre (110.4743, -16.4118) ccw
  line L39 (76.162, 24.4099) -> (66.162, -9.1259)
  line L40 (69.4242, -14.7876) -> (108.6075, -24.1909)
  line L41 (114.1862, -23.4986) -> (152.5623, -3.3981)
  line L42 (154.0408, 3.3323) -> (131.2097, 33.0062)
  line L43 (126.9698, 34.7115) -> (79.801, 27.5733)
  circle A40 centre (-145.5257, 0.5882) radius 1.5
  arc A41 (-149.0922, 3.3323) -> (-147.6136, -3.3981) centre (-145.5257, 0.5882) ccw
  circle A42 centre (-105.5257, -16.4118) radius 5
  arc A43 (-109.2375, -23.4986) -> (-103.6588, -24.1909) centre (-105.5257, -16.4118) ccw
  circle A44 centre (-65.5257, -10.4118) radius 1.5
  arc A45 (-64.4756, -14.7876) -> (-61.2133, -9.1259) centre (-65.5257, -10.4118) ccw
  circle A46 centre (0, 0) radius 20.05 construction
  circle A47 centre (110.4743, -16.4118) radius 30.1 construction
  circle A48 centre (62.4131, -12.7569) radius 22.1 construction
  circle A49 centre (25.3202, -9.9362) radius 19.1 construction
  circle A50 centre (0, 0) radius 12.1 construction
  circle A51 centre (-21.6908, -16.4118) radius 19.1 construction
  circle A52 centre (-105.5257, -16.4118) radius 30.1 construction
  circle A53 centre (0, 0) radius 20.55 construction
  circle A54 centre (95.5937, 20.7173) radius 4.025 construction
  circle A55 centre (95.5937, 20.7173) radius 6.025 construction
  circle A56 centre (-75.5257, 23.124) radius 1.5
  arc A57 (-71.2133, 24.4099) -> (-74.8523, 27.5733) centre (-75.5257, 23.124) ccw
  circle A58 centre (-122.6945, 30.2622) radius 1.5
  arc A59 (-122.0212, 34.7115) -> (-126.261, 33.0062) centre (-122.6945, 30.2622) ccw
  line L44 (-126.261, 33.0062) -> (-149.0922, 3.3323)
  line L45 (-147.6136, -3.3981) -> (-109.2375, -23.4986)
  line L46 (-103.6588, -24.1909) -> (-64.4756, -14.7876)
  line L47 (-61.2133, -9.1259) -> (-71.2133, 24.4099)
  line L48 (-74.8523, 27.5733) -> (-122.0212, 34.7115)
  circle A60 centre (14, -17.4118) radius 2.2921 construction
  circle A61 centre (-14, -17.4118) radius 2.2921 construction
  circle A62 centre (-14, -17.4118) radius 14 construction
  circle A63 centre (14, -17.4118) radius 14 construction
  line L49 (-170.6512, -31.4118) -> (202.8656, -31.4118)
  line L50 (5.9362, 53.5882) -> (-42.2529, 34.177) construction
  line L51 (5.9362, 53.5882) -> (-29.4045, 15.5091) construction
  circle A64 centre (5.9362, 53.5882) radius 1.5
  arc A65 (9.9611, 55.6008) -> (4.2549, 57.7623) centre (5.9362, 53.5882) ccw
  line L52 (-21.6908, -16.4118) -> (-99.9742, 13.5882) construction
  line L53 (-21.6908, -16.4118) -> (-101.7113, -41.4118) construction
  line L54 (9.9611, 55.6008) -> (31.4156, 12.6947)
  circle A66 centre (-50.601, 30.8143) radius 1.5
  arc A67 (-52.2824, 34.9884) -> (-54.4248, 28.4418) centre (-50.601, 30.8143) ccw
  line L55 (4.2549, 57.7623) -> (-52.2824, 34.9884)
  line L56 (-54.4248, 28.4418) -> (-46.7151, 16.0162)
  circle A68 centre (27.3908, 10.6821) radius 3 construction
  circle A69 centre (-84.8661, 5.2713) radius 4.5 construction
  circle A70 centre (-132.0174, -1.9813) radius 4.5 construction
  line L57 (-132.7015, 2.4664) -> (-85.5502, 9.719) construction
  arc A71 (26.9003, 6.2089) -> (31.4156, 12.6947) centre (27.3908, 10.6821) ccw
  arc A72 (-46.7151, 16.0162) -> (-43.3819, 13.9155) centre (-42.8914, 18.3887) ccw
  line L58 (-43.3819, 13.9155) -> (26.9003, 6.2089)
  circle A73 centre (-42.2529, 34.177) radius 3 construction
  circle A74 centre (25.3202, -9.9362) radius 4.025 construction
  circle A75 centre (-21.6908, -16.4118) radius 4.025 construction
  circle A76 centre (-42.8914, 18.3887) radius 1.5
  circle A77 centre (27.3908, 10.6821) radius 1.5
  circle A78 centre (-57.813, 39.7705) radius 4.5 construction
  circle A79 centre (-99.304, 63.3152) radius 4.5 construction
  line L59 (5.9362, 53.5882) -> (-35.9404, 22.842) construction
  circle A80 centre (-58.0056, -24.4791) radius 20.1 construction
  circle A81 centre (-58.0056, -24.4791) radius 22.1 construction
  line L60 (-53.3261, 39.4281) -> (-56.2797, 0.7243) construction
  circle A82 centre (-42.2529, 34.177) radius 4.5
  dimension "d169" = 9
  dimension "d170" = 9
  dimension "d185" = 9
  dimension "d52" = 8.05
  dimension "d53" = 8.05
  dimension "d54" = 3
  dimension "d55" = 3
  dimension "d56" = 15
  dimension "d57" = 3
  dimension "d58" = 15
  dimension "d59" = 6
  dimension "d60" = 6
  dimension "d61" = 9
  dimension "d62" = 9
  dimension "d63" = 3
  dimension "d64" = 3
  dimension "d65" = 7.5
  dimension "d66" = 7.5
  dimension "d67" = 40
  dimension "d68" = 40
  dimension "d69" = 2.1
  dimension "d70" = 2.1
  dimension "d71" = 2.1
  dimension "d72" = 2.1
  dimension "d73" = 2.1
  dimension "d74" = 2.1
  dimension "d75" = 2.1
  dimension "d76" = 2.1
  dimension "d77" = 3
  dimension "d78" = 6
  dimension "d79" = 3
  dimension "d80" = 3
  dimension "d81" = 20.2
  dimension "d82" = 34.2
  dimension "d83" = 56.2
  dimension "d84" = 40.2
  dimension "d85" = 216
  dimension "d86" = 65
  dimension "d87" = 65
  dimension "d88" = 34.2
  dimension "d89" = 56.2
  dimension "d90" = 17
  dimension "d91" = 23
  dimension "d92" = 40
  dimension "d93" = 40
  dimension "d94" = 6
  dimension "d95" = 135
  dimension "d96" = 25
  dimension "d97" = 30
  dimension "d98" = 5
  dimension "d99" = 2
  dimension "d100" = 250
  dimension "d101" = 150
  dimension "d102" = 250
  dimension "d103" = 250
  dimension "d104" = 123.823
  dimension "d105" = 123.823
  dimension "d106" = 123.823
  dimension "d107" = 6
  dimension "d108" = 3
  dimension "d109" = 9
  dimension "d110" = 3
  dimension "d111" = 9
  dimension "d112" = 3
  dimension "d113" = 9
  dimension "d114" = 40
  dimension "d115" = 17
sketch "スケッチ5" plane through (0, 0, 3) normal (0, 0, 1) x (1, 0, 0)
  arc A0 (-42.2529, 34.177) -> (-29.4045, 15.5091) centre (5.9362, 53.5882) ccw construction
  arc A1 (-45.2675, 32.9627) -> (-31.6153, 13.1269) centre (5.9362, 53.5882) ccw
  arc A2 (-39.2383, 35.3914) -> (-27.1936, 17.8913) centre (5.9362, 53.5882) ccw
  arc A3 (-39.2383, 35.3914) -> (-45.2675, 32.9627) centre (-42.2529, 34.177) ccw
  arc A4 (-31.6153, 13.1269) -> (-27.1936, 17.8913) centre (-29.4045, 15.5091) ccw
  arc A5 (-37.3831, 36.1386) -> (-25.8331, 19.3572) centre (5.9362, 53.5882) ccw
  arc A6 (-37.3831, 36.1386) -> (-47.1226, 32.2154) centre (-42.2529, 34.177) ccw
  arc A7 (-47.1226, 32.2154) -> (-32.9758, 11.661) centre (5.9362, 53.5882) ccw
  arc A8 (-28.862, 45.1007) -> (-26.5668, 46.0915) centre (-26.5254, 42.8418) ccw projected
  line L0 (-28.862, 45.1007) -> (-52.3846, 34.9457) projected
  arc A9 (-52.3846, 34.9457) -> (-54.4248, 28.4418) centre (-50.601, 30.8143) ccw projected
  line L1 (-54.4248, 28.4418) -> (-46.7151, 16.0162) projected
  arc A10 (-46.7151, 16.0162) -> (-43.3819, 13.9155) centre (-42.8914, 18.3887) ccw projected
  line L2 (-43.3819, 13.9155) -> (26.9003, 6.2089) projected
  arc A11 (26.9003, 6.2089) -> (31.4766, 12.5678) centre (27.3908, 10.6821) ccw projected
  line L3 (31.4766, 12.5678) -> (11.384, 56.1025) projected
  arc A12 (11.384, 56.1025) -> (3.5581, 59.0968) centre (5.9362, 53.5882) ccw projected
  line L4 (3.5581, 59.0968) -> (-4.5324, 55.604) projected
  arc A13 (-6.8277, 54.6131) -> (-4.5324, 55.604) centre (-4.491, 52.3543) ccw projected
  line L5 (-6.8277, 54.6131) -> (-26.5668, 46.0915) projected
  circle A14 centre (5.9362, 53.5882) radius 4.025 projected
  circle A15 centre (27.3908, 10.6821) radius 1.5 projected
  circle A16 centre (-42.8914, 18.3887) radius 1.5 projected
  circle A17 centre (-50.601, 30.8143) radius 1.5 projected
  arc A18 (-46.7151, 16.0162) -> (-43.3819, 13.9155) centre (-42.8914, 18.3887) ccw projected
  line L6 (-29.7802, 10.2726) -> (27.0687, 6.1936)
  arc A19 (26.9003, 6.2089) -> (31.4766, 12.5678) centre (27.3908, 10.6821) ccw projected
  line L7 (-44.0689, 14.0455) -> (-30.7783, 10.442)
  arc A20 (-30.7783, 10.442) -> (-29.7802, 10.2726) centre (-29.4045, 15.5091) ccw
  arc A21 (-25.537, 11.9588) -> (-25.8331, 19.3572) centre (-29.4045, 15.5091) ccw
  point P0 (0, 0)
  point P1 (-35.9404, 22.842)
  dimension "d199" = 6.5
  dimension "d200" = 2
  dimension "d201" = 2
extrude "押し出し3" add sketch "スケッチ5" against normal blind 3 contours L2 A4 | A4 L2 A11 L6 A20 L7 A10
extrude "押し出し4" cut sketch "スケッチ5" against normal blind 3 contours A3 A2 A4 L2 A1 | L2 A4
sketch "スケッチ6" plane through (0, 0, 0) normal (0, 0, -1) x (-1, 0, 0)
  arc A0 (27.1936, 17.8913) -> (31.6153, 13.1269) centre (29.4045, 15.5091) ccw projected
  arc A1 (27.1936, 17.8913) -> (39.2383, 35.3914) centre (-5.9362, 53.5882) ccw projected
  arc A2 (45.2675, 32.9627) -> (39.2383, 35.3914) centre (42.2529, 34.177) ccw projected
  arc A3 (31.6153, 13.1269) -> (45.2675, 32.9627) centre (-5.9362, 53.5882) ccw projected
  circle A4 centre (26.5254, 42.8418) radius 1.5 projected
  circle A5 centre (4.491, 52.3543) radius 1.5 projected
  circle A6 centre (-5.9362, 53.5882) radius 4.025 projected
  circle A7 centre (-27.3908, 10.6821) radius 1.5 projected
  circle A8 centre (42.8914, 18.3887) radius 1.5 projected
  circle A9 centre (50.601, 30.8143) radius 1.5 projected
  line L0 (46.7151, 16.0162) -> (54.4248, 28.4418) projected
  arc A10 (54.4248, 28.4418) -> (52.3846, 34.9457) centre (50.601, 30.8143) ccw projected
  line L1 (52.3846, 34.9457) -> (-3.5581, 59.0968) projected
  arc A11 (-3.5581, 59.0968) -> (-11.384, 56.1025) centre (-5.9362, 53.5882) ccw projected
  line L2 (-11.384, 56.1025) -> (-31.4766, 12.5678) projected
  arc A12 (-31.4766, 12.5678) -> (-27.0687, 6.1936) centre (-27.3908, 10.6821) ccw projected
  line L3 (-27.0687, 6.1936) -> (29.7802, 10.2726) projected
  arc A13 (29.7802, 10.2726) -> (30.7783, 10.442) centre (29.4045, 15.5091) ccw projected
  line L4 (30.7783, 10.442) -> (44.0689, 14.0455) projected
  arc A14 (44.0689, 14.0455) -> (46.7151, 16.0162) centre (42.8914, 18.3887) ccw projected
  line L5 (-4.7472, 56.3425) -> (51.1956, 32.1914)
  arc A15 (51.8756, 30.0234) -> (51.1956, 32.1914) centre (50.601, 30.8143) ccw
  line L6 (51.8756, 30.0234) -> (44.166, 17.5978)
  arc A16 (43.2839, 16.9409) -> (44.166, 17.5978) centre (42.8914, 18.3887) ccw
  line L7 (43.2839, 16.9409) -> (29.9932, 13.3375)
  arc A17 (29.5655, 13.2649) -> (29.9932, 13.3375) centre (29.4045, 15.5091) ccw
  line L8 (29.5655, 13.2649) -> (-27.2834, 9.1859)
  arc A18 (-28.7527, 11.3107) -> (-27.2834, 9.1859) centre (-27.3908, 10.6821) ccw
  line L9 (-28.7527, 11.3107) -> (-8.6601, 54.8454)
  arc A19 (-4.7472, 56.3425) -> (-8.6601, 54.8454) centre (-5.9362, 53.5882) ccw
  arc A20 (-11.322, 49.0778) -> (0.3825, 50.5184) centre (-5.9362, 53.5882) ccw
  arc A21 (25.1528, 20.0902) -> (36.4555, 36.5123) centre (-5.9362, 53.5882) ccw
  arc A22 (25.1528, 20.0902) -> (23.7495, 12.8476) centre (29.4045, 15.5091) ccw
  arc A23 (33.6561, 10.928) -> (34.0975, 11.3419) centre (-5.9362, 53.5882) ccw
  arc A24 (22.3939, 44.6254) -> (30.6568, 41.0582) centre (26.5254, 42.8418) ccw
  arc A25 (0.3825, 50.5184) -> (8.6224, 50.5707) centre (4.491, 52.3543) ccw
  arc A26 (-23.0517, 9.4896) -> (-26.9748, 15.1628) centre (-27.3908, 10.6821) ccw
  arc A27 (37.419, 38.1389) -> (36.4555, 36.5123) centre (42.2529, 34.177) ccw
  point P0 (0, 0)
  dimension "d206" = 3
  dimension "d207" = 3
  dimension "d208" = 3
  dimension "d209" = 3
  dimension "d210" = 3
  dimension "d212" = 3
  dimension "d213" = 3
  dimension "d214" = 3
extrude "押し出し5" cut sketch "スケッチ6" against normal blind 2.5 contours L8 A26 L9 A20 A25 L5 A24 A27 A21 A22
fillet "フィレット1" radius 1 9 edges at (-23.7495, 12.8476, 1.25) (23.0517, 9.4896, 1.25) (26.9748, 15.1628, 1.25) (11.322, 49.0778, 1.25) (-0.3825, 50.5184, 1.25) (-8.6224, 50.5707, 1.25) (-22.3939, 44.6254, 1.25) (-30.6568, 41.0582, 1.25) (-37.419, 38.1389, 1.25)
equation "\"d4\" = d3"
equation "\"d6\" = d5"
equation "\"d8\" = d7"
equation "\"d10\" = d9"
equation "\"d16\" = d3"
equation "\"d17\" = d3"
equation "\"d27\" = d7"
equation "\"d68\" = d67"
equation "\"d88\" = d82"
equation "\"d89\" = d83"
equation "\"d105\" = d104"
equation "\"d106\" = d104"
properties part number "中間外フレーム2" material "アルミニウム 2014-T4"
